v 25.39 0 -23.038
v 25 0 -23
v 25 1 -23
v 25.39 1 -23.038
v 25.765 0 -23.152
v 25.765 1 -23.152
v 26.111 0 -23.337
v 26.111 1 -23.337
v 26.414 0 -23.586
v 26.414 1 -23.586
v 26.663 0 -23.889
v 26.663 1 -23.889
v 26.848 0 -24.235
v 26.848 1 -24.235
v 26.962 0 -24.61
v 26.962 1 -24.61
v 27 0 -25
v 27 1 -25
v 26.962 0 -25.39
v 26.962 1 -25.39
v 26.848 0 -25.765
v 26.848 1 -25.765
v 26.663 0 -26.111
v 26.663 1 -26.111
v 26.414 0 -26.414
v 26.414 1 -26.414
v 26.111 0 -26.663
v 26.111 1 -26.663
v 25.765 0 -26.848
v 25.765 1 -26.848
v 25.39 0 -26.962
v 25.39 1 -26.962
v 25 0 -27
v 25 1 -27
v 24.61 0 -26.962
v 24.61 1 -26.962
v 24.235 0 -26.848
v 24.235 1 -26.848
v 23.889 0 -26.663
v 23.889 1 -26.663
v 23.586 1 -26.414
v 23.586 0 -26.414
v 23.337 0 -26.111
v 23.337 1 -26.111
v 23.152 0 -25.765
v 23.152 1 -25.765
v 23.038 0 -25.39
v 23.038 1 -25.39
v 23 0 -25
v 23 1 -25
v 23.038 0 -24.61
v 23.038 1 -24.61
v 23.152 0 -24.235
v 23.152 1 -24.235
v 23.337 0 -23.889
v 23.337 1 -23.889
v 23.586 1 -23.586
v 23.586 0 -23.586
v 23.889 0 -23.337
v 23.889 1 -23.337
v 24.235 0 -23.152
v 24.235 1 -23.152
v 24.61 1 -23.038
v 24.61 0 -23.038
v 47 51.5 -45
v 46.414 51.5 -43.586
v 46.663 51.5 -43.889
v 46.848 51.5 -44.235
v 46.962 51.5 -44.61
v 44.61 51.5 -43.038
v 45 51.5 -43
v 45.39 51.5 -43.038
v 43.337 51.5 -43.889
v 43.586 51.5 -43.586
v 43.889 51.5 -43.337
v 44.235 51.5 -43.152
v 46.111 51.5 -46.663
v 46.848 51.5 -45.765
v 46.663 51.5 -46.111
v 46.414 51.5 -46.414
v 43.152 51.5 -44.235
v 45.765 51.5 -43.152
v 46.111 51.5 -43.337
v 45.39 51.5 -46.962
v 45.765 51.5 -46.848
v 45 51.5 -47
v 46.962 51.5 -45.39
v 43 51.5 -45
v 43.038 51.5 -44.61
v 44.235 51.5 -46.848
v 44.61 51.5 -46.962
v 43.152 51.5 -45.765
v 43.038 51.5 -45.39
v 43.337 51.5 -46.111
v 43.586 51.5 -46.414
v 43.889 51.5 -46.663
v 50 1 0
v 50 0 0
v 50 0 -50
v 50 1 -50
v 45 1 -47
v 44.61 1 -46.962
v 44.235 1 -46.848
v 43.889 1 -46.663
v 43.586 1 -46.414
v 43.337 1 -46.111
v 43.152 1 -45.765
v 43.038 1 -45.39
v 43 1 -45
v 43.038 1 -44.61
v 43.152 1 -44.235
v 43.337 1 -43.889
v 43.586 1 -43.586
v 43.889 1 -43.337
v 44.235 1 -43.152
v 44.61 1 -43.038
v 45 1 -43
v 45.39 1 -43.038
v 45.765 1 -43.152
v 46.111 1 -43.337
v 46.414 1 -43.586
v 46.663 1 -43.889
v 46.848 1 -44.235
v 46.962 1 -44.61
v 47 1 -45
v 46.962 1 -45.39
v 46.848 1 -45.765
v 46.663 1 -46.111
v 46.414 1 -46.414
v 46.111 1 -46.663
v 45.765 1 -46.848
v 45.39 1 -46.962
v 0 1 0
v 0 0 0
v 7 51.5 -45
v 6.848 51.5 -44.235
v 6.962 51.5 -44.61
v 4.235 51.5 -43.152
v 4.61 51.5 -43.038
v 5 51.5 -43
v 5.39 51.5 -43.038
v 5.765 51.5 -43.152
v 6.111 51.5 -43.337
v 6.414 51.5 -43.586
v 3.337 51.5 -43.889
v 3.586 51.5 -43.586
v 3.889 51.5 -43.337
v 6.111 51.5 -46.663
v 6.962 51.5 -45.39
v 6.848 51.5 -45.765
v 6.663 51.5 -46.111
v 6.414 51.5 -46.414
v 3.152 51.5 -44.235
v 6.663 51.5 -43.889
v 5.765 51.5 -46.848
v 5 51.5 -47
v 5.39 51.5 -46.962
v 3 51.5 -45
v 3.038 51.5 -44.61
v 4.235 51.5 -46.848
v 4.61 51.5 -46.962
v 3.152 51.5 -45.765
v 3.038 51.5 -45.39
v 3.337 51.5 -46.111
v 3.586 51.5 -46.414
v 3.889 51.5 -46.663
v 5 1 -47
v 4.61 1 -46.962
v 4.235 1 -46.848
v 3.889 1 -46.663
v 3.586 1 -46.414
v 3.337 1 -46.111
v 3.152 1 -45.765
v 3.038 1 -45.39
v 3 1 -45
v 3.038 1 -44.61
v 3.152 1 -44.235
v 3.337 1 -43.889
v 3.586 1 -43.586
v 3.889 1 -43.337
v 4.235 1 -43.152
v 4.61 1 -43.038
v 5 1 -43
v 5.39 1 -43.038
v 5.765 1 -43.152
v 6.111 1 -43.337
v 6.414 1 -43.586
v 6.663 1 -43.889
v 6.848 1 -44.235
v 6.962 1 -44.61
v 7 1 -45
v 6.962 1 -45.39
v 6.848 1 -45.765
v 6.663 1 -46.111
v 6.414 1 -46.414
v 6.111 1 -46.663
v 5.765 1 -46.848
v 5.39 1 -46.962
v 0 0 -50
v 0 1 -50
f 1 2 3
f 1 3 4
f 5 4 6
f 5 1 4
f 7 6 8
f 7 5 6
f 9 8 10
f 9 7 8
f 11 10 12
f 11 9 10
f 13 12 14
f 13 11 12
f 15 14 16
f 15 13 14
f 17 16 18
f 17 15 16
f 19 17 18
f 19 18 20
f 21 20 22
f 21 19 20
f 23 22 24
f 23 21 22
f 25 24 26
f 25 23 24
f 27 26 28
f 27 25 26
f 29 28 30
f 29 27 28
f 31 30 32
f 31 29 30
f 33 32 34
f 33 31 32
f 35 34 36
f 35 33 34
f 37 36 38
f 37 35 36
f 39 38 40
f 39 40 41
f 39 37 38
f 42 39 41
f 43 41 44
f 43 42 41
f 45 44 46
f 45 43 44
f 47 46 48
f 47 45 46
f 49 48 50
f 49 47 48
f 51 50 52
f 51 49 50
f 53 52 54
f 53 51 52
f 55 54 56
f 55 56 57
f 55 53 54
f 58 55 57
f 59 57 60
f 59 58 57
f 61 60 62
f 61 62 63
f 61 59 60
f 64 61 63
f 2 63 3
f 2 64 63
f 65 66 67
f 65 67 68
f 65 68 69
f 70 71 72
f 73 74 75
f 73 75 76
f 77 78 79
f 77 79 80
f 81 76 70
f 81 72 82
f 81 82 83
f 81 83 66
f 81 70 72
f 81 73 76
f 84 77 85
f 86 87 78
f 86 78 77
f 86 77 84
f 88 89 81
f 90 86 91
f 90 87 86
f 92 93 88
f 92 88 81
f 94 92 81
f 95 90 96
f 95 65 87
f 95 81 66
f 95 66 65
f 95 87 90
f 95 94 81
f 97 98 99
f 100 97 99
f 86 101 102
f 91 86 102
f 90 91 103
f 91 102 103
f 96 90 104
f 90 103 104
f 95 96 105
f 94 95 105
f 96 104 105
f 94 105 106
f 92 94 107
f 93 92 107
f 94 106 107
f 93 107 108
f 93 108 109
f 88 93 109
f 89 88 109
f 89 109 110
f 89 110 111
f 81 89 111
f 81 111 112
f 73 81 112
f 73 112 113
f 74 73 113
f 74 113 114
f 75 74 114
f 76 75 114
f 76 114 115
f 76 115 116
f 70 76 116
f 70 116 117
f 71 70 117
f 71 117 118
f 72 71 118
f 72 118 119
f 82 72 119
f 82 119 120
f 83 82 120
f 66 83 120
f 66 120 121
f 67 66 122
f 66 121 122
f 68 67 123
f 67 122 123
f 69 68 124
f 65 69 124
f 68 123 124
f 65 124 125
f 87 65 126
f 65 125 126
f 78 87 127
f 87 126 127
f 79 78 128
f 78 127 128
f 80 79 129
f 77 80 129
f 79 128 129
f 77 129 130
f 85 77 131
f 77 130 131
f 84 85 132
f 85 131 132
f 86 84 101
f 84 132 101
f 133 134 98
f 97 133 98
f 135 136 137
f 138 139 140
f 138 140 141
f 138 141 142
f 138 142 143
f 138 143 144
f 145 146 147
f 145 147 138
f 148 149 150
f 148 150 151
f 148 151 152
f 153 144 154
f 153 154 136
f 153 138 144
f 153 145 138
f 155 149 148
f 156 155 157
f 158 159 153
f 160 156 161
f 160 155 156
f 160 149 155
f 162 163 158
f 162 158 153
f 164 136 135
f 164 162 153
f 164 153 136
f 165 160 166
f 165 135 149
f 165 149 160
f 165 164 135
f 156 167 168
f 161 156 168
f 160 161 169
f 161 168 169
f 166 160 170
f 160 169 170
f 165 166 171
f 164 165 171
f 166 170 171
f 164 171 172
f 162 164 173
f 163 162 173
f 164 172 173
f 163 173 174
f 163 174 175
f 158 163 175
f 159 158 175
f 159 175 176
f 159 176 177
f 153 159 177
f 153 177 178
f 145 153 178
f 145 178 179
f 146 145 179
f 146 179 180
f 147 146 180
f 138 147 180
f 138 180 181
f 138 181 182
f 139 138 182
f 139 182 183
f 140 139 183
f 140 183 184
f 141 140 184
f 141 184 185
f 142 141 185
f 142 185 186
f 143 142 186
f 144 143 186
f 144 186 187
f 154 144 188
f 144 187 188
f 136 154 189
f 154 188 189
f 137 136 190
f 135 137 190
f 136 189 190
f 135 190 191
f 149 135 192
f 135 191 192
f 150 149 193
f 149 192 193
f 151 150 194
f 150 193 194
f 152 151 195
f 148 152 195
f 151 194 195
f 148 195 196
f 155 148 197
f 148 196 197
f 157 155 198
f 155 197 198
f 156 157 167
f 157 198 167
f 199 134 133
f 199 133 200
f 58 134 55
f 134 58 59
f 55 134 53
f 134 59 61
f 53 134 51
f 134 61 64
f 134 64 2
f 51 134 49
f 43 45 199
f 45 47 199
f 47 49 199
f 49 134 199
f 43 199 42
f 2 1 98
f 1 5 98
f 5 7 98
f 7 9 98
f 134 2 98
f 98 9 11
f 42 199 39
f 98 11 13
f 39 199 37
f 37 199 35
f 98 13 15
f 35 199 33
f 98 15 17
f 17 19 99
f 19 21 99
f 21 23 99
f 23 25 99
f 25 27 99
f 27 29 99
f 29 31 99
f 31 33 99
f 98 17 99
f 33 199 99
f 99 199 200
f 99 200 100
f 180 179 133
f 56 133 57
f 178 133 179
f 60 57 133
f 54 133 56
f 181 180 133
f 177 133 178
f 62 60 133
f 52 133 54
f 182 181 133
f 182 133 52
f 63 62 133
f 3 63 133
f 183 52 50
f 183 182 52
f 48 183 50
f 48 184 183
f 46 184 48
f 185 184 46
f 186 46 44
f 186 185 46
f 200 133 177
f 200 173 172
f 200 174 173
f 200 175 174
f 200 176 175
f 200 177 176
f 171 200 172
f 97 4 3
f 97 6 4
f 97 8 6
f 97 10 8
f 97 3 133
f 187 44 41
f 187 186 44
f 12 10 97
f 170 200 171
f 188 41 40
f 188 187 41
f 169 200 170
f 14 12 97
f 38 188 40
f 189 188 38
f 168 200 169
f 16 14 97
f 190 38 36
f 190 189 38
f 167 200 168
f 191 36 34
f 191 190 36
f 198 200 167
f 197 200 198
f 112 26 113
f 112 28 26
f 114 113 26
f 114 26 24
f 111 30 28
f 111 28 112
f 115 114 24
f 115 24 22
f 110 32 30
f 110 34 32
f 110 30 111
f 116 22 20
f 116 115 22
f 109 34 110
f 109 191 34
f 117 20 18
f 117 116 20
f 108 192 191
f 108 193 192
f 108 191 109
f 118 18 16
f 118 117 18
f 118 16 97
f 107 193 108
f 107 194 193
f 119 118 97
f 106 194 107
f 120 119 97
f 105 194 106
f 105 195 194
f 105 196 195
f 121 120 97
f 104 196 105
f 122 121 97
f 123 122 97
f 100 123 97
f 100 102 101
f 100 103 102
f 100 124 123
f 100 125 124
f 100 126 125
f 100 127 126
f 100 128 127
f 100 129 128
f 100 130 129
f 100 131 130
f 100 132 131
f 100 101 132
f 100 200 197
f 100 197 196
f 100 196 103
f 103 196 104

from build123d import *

# Parameters (mm, degrees)
SKETCH1_W           = 50
SKETCH1_H           = 50
SKETCH1_R           = 2
BOSS_EXTRUDE1_DEPTH = 1
SKETCH2_R           = 2
BOSS_EXTRUDE2_DEPTH = 70
CUT_EXTRUDE1_START  = -9.5
SKETCH7_R           = 2
CUT_EXTRUDE1_DEPTH  = 9.5
CUT_EXTRUDE2_START  = -10
SKETCH9_R           = 2
CUT_EXTRUDE2_DEPTH  = 10


with BuildPart() as part:
    # Sketch1 → Boss-Extrude1 (new body)
    with BuildSketch(Plane(origin=(0, 0, 0), x_dir=(1, 0, 0), z_dir=(0, 1, 0))):
        with Locations((25, 25)):
            Rectangle(SKETCH1_W, SKETCH1_H)
        with Locations(Location((25, 25, 0), (0, 0, 270))):
            Circle(SKETCH1_R, mode=Mode.SUBTRACT)
    extrude(amount=BOSS_EXTRUDE1_DEPTH)

    # Sketch2 → Boss-Extrude2 (add)
    with BuildSketch(Plane(origin=(0, 1, 0), x_dir=(1, 0, 0), z_dir=(0, 1, 0))):
        with Locations(Location((5, 45, 0), (0, 0, 90))):
            Circle(SKETCH2_R)
        with Locations(Location((45, 45, 0), (0, 0, 90))):
            Circle(SKETCH2_R)
    extrude(amount=BOSS_EXTRUDE2_DEPTH)

    # Sketch7 → Cut-Extrude1 (cut)
    with BuildSketch(Plane(origin=(0, 71, 0), x_dir=(1, 0, 0), z_dir=(0, 1, 0)).offset(CUT_EXTRUDE1_START)):
        with Locations(Location((5, 45, 0), (0, 0, 90))):
            Circle(SKETCH7_R)
        with Locations(Location((45, 45, 0), (0, 0, 90))):
            Circle(SKETCH7_R)
    extrude(amount=CUT_EXTRUDE1_DEPTH, mode=Mode.SUBTRACT)

    # Sketch9 → Cut-Extrude2 (cut)
    with BuildSketch(Plane(origin=(0, 61.5, 0), x_dir=(1, 0, 0), z_dir=(0, 1, 0)).offset(CUT_EXTRUDE2_START)):
        with Locations(Location((5, 45, 0), (0, 0, 90))):
            Circle(SKETCH9_R)
        with Locations(Location((45, 45, 0), (0, 0, 90))):
            Circle(SKETCH9_R)
    extrude(amount=CUT_EXTRUDE2_DEPTH, mode=Mode.SUBTRACT)


solid = part.part
